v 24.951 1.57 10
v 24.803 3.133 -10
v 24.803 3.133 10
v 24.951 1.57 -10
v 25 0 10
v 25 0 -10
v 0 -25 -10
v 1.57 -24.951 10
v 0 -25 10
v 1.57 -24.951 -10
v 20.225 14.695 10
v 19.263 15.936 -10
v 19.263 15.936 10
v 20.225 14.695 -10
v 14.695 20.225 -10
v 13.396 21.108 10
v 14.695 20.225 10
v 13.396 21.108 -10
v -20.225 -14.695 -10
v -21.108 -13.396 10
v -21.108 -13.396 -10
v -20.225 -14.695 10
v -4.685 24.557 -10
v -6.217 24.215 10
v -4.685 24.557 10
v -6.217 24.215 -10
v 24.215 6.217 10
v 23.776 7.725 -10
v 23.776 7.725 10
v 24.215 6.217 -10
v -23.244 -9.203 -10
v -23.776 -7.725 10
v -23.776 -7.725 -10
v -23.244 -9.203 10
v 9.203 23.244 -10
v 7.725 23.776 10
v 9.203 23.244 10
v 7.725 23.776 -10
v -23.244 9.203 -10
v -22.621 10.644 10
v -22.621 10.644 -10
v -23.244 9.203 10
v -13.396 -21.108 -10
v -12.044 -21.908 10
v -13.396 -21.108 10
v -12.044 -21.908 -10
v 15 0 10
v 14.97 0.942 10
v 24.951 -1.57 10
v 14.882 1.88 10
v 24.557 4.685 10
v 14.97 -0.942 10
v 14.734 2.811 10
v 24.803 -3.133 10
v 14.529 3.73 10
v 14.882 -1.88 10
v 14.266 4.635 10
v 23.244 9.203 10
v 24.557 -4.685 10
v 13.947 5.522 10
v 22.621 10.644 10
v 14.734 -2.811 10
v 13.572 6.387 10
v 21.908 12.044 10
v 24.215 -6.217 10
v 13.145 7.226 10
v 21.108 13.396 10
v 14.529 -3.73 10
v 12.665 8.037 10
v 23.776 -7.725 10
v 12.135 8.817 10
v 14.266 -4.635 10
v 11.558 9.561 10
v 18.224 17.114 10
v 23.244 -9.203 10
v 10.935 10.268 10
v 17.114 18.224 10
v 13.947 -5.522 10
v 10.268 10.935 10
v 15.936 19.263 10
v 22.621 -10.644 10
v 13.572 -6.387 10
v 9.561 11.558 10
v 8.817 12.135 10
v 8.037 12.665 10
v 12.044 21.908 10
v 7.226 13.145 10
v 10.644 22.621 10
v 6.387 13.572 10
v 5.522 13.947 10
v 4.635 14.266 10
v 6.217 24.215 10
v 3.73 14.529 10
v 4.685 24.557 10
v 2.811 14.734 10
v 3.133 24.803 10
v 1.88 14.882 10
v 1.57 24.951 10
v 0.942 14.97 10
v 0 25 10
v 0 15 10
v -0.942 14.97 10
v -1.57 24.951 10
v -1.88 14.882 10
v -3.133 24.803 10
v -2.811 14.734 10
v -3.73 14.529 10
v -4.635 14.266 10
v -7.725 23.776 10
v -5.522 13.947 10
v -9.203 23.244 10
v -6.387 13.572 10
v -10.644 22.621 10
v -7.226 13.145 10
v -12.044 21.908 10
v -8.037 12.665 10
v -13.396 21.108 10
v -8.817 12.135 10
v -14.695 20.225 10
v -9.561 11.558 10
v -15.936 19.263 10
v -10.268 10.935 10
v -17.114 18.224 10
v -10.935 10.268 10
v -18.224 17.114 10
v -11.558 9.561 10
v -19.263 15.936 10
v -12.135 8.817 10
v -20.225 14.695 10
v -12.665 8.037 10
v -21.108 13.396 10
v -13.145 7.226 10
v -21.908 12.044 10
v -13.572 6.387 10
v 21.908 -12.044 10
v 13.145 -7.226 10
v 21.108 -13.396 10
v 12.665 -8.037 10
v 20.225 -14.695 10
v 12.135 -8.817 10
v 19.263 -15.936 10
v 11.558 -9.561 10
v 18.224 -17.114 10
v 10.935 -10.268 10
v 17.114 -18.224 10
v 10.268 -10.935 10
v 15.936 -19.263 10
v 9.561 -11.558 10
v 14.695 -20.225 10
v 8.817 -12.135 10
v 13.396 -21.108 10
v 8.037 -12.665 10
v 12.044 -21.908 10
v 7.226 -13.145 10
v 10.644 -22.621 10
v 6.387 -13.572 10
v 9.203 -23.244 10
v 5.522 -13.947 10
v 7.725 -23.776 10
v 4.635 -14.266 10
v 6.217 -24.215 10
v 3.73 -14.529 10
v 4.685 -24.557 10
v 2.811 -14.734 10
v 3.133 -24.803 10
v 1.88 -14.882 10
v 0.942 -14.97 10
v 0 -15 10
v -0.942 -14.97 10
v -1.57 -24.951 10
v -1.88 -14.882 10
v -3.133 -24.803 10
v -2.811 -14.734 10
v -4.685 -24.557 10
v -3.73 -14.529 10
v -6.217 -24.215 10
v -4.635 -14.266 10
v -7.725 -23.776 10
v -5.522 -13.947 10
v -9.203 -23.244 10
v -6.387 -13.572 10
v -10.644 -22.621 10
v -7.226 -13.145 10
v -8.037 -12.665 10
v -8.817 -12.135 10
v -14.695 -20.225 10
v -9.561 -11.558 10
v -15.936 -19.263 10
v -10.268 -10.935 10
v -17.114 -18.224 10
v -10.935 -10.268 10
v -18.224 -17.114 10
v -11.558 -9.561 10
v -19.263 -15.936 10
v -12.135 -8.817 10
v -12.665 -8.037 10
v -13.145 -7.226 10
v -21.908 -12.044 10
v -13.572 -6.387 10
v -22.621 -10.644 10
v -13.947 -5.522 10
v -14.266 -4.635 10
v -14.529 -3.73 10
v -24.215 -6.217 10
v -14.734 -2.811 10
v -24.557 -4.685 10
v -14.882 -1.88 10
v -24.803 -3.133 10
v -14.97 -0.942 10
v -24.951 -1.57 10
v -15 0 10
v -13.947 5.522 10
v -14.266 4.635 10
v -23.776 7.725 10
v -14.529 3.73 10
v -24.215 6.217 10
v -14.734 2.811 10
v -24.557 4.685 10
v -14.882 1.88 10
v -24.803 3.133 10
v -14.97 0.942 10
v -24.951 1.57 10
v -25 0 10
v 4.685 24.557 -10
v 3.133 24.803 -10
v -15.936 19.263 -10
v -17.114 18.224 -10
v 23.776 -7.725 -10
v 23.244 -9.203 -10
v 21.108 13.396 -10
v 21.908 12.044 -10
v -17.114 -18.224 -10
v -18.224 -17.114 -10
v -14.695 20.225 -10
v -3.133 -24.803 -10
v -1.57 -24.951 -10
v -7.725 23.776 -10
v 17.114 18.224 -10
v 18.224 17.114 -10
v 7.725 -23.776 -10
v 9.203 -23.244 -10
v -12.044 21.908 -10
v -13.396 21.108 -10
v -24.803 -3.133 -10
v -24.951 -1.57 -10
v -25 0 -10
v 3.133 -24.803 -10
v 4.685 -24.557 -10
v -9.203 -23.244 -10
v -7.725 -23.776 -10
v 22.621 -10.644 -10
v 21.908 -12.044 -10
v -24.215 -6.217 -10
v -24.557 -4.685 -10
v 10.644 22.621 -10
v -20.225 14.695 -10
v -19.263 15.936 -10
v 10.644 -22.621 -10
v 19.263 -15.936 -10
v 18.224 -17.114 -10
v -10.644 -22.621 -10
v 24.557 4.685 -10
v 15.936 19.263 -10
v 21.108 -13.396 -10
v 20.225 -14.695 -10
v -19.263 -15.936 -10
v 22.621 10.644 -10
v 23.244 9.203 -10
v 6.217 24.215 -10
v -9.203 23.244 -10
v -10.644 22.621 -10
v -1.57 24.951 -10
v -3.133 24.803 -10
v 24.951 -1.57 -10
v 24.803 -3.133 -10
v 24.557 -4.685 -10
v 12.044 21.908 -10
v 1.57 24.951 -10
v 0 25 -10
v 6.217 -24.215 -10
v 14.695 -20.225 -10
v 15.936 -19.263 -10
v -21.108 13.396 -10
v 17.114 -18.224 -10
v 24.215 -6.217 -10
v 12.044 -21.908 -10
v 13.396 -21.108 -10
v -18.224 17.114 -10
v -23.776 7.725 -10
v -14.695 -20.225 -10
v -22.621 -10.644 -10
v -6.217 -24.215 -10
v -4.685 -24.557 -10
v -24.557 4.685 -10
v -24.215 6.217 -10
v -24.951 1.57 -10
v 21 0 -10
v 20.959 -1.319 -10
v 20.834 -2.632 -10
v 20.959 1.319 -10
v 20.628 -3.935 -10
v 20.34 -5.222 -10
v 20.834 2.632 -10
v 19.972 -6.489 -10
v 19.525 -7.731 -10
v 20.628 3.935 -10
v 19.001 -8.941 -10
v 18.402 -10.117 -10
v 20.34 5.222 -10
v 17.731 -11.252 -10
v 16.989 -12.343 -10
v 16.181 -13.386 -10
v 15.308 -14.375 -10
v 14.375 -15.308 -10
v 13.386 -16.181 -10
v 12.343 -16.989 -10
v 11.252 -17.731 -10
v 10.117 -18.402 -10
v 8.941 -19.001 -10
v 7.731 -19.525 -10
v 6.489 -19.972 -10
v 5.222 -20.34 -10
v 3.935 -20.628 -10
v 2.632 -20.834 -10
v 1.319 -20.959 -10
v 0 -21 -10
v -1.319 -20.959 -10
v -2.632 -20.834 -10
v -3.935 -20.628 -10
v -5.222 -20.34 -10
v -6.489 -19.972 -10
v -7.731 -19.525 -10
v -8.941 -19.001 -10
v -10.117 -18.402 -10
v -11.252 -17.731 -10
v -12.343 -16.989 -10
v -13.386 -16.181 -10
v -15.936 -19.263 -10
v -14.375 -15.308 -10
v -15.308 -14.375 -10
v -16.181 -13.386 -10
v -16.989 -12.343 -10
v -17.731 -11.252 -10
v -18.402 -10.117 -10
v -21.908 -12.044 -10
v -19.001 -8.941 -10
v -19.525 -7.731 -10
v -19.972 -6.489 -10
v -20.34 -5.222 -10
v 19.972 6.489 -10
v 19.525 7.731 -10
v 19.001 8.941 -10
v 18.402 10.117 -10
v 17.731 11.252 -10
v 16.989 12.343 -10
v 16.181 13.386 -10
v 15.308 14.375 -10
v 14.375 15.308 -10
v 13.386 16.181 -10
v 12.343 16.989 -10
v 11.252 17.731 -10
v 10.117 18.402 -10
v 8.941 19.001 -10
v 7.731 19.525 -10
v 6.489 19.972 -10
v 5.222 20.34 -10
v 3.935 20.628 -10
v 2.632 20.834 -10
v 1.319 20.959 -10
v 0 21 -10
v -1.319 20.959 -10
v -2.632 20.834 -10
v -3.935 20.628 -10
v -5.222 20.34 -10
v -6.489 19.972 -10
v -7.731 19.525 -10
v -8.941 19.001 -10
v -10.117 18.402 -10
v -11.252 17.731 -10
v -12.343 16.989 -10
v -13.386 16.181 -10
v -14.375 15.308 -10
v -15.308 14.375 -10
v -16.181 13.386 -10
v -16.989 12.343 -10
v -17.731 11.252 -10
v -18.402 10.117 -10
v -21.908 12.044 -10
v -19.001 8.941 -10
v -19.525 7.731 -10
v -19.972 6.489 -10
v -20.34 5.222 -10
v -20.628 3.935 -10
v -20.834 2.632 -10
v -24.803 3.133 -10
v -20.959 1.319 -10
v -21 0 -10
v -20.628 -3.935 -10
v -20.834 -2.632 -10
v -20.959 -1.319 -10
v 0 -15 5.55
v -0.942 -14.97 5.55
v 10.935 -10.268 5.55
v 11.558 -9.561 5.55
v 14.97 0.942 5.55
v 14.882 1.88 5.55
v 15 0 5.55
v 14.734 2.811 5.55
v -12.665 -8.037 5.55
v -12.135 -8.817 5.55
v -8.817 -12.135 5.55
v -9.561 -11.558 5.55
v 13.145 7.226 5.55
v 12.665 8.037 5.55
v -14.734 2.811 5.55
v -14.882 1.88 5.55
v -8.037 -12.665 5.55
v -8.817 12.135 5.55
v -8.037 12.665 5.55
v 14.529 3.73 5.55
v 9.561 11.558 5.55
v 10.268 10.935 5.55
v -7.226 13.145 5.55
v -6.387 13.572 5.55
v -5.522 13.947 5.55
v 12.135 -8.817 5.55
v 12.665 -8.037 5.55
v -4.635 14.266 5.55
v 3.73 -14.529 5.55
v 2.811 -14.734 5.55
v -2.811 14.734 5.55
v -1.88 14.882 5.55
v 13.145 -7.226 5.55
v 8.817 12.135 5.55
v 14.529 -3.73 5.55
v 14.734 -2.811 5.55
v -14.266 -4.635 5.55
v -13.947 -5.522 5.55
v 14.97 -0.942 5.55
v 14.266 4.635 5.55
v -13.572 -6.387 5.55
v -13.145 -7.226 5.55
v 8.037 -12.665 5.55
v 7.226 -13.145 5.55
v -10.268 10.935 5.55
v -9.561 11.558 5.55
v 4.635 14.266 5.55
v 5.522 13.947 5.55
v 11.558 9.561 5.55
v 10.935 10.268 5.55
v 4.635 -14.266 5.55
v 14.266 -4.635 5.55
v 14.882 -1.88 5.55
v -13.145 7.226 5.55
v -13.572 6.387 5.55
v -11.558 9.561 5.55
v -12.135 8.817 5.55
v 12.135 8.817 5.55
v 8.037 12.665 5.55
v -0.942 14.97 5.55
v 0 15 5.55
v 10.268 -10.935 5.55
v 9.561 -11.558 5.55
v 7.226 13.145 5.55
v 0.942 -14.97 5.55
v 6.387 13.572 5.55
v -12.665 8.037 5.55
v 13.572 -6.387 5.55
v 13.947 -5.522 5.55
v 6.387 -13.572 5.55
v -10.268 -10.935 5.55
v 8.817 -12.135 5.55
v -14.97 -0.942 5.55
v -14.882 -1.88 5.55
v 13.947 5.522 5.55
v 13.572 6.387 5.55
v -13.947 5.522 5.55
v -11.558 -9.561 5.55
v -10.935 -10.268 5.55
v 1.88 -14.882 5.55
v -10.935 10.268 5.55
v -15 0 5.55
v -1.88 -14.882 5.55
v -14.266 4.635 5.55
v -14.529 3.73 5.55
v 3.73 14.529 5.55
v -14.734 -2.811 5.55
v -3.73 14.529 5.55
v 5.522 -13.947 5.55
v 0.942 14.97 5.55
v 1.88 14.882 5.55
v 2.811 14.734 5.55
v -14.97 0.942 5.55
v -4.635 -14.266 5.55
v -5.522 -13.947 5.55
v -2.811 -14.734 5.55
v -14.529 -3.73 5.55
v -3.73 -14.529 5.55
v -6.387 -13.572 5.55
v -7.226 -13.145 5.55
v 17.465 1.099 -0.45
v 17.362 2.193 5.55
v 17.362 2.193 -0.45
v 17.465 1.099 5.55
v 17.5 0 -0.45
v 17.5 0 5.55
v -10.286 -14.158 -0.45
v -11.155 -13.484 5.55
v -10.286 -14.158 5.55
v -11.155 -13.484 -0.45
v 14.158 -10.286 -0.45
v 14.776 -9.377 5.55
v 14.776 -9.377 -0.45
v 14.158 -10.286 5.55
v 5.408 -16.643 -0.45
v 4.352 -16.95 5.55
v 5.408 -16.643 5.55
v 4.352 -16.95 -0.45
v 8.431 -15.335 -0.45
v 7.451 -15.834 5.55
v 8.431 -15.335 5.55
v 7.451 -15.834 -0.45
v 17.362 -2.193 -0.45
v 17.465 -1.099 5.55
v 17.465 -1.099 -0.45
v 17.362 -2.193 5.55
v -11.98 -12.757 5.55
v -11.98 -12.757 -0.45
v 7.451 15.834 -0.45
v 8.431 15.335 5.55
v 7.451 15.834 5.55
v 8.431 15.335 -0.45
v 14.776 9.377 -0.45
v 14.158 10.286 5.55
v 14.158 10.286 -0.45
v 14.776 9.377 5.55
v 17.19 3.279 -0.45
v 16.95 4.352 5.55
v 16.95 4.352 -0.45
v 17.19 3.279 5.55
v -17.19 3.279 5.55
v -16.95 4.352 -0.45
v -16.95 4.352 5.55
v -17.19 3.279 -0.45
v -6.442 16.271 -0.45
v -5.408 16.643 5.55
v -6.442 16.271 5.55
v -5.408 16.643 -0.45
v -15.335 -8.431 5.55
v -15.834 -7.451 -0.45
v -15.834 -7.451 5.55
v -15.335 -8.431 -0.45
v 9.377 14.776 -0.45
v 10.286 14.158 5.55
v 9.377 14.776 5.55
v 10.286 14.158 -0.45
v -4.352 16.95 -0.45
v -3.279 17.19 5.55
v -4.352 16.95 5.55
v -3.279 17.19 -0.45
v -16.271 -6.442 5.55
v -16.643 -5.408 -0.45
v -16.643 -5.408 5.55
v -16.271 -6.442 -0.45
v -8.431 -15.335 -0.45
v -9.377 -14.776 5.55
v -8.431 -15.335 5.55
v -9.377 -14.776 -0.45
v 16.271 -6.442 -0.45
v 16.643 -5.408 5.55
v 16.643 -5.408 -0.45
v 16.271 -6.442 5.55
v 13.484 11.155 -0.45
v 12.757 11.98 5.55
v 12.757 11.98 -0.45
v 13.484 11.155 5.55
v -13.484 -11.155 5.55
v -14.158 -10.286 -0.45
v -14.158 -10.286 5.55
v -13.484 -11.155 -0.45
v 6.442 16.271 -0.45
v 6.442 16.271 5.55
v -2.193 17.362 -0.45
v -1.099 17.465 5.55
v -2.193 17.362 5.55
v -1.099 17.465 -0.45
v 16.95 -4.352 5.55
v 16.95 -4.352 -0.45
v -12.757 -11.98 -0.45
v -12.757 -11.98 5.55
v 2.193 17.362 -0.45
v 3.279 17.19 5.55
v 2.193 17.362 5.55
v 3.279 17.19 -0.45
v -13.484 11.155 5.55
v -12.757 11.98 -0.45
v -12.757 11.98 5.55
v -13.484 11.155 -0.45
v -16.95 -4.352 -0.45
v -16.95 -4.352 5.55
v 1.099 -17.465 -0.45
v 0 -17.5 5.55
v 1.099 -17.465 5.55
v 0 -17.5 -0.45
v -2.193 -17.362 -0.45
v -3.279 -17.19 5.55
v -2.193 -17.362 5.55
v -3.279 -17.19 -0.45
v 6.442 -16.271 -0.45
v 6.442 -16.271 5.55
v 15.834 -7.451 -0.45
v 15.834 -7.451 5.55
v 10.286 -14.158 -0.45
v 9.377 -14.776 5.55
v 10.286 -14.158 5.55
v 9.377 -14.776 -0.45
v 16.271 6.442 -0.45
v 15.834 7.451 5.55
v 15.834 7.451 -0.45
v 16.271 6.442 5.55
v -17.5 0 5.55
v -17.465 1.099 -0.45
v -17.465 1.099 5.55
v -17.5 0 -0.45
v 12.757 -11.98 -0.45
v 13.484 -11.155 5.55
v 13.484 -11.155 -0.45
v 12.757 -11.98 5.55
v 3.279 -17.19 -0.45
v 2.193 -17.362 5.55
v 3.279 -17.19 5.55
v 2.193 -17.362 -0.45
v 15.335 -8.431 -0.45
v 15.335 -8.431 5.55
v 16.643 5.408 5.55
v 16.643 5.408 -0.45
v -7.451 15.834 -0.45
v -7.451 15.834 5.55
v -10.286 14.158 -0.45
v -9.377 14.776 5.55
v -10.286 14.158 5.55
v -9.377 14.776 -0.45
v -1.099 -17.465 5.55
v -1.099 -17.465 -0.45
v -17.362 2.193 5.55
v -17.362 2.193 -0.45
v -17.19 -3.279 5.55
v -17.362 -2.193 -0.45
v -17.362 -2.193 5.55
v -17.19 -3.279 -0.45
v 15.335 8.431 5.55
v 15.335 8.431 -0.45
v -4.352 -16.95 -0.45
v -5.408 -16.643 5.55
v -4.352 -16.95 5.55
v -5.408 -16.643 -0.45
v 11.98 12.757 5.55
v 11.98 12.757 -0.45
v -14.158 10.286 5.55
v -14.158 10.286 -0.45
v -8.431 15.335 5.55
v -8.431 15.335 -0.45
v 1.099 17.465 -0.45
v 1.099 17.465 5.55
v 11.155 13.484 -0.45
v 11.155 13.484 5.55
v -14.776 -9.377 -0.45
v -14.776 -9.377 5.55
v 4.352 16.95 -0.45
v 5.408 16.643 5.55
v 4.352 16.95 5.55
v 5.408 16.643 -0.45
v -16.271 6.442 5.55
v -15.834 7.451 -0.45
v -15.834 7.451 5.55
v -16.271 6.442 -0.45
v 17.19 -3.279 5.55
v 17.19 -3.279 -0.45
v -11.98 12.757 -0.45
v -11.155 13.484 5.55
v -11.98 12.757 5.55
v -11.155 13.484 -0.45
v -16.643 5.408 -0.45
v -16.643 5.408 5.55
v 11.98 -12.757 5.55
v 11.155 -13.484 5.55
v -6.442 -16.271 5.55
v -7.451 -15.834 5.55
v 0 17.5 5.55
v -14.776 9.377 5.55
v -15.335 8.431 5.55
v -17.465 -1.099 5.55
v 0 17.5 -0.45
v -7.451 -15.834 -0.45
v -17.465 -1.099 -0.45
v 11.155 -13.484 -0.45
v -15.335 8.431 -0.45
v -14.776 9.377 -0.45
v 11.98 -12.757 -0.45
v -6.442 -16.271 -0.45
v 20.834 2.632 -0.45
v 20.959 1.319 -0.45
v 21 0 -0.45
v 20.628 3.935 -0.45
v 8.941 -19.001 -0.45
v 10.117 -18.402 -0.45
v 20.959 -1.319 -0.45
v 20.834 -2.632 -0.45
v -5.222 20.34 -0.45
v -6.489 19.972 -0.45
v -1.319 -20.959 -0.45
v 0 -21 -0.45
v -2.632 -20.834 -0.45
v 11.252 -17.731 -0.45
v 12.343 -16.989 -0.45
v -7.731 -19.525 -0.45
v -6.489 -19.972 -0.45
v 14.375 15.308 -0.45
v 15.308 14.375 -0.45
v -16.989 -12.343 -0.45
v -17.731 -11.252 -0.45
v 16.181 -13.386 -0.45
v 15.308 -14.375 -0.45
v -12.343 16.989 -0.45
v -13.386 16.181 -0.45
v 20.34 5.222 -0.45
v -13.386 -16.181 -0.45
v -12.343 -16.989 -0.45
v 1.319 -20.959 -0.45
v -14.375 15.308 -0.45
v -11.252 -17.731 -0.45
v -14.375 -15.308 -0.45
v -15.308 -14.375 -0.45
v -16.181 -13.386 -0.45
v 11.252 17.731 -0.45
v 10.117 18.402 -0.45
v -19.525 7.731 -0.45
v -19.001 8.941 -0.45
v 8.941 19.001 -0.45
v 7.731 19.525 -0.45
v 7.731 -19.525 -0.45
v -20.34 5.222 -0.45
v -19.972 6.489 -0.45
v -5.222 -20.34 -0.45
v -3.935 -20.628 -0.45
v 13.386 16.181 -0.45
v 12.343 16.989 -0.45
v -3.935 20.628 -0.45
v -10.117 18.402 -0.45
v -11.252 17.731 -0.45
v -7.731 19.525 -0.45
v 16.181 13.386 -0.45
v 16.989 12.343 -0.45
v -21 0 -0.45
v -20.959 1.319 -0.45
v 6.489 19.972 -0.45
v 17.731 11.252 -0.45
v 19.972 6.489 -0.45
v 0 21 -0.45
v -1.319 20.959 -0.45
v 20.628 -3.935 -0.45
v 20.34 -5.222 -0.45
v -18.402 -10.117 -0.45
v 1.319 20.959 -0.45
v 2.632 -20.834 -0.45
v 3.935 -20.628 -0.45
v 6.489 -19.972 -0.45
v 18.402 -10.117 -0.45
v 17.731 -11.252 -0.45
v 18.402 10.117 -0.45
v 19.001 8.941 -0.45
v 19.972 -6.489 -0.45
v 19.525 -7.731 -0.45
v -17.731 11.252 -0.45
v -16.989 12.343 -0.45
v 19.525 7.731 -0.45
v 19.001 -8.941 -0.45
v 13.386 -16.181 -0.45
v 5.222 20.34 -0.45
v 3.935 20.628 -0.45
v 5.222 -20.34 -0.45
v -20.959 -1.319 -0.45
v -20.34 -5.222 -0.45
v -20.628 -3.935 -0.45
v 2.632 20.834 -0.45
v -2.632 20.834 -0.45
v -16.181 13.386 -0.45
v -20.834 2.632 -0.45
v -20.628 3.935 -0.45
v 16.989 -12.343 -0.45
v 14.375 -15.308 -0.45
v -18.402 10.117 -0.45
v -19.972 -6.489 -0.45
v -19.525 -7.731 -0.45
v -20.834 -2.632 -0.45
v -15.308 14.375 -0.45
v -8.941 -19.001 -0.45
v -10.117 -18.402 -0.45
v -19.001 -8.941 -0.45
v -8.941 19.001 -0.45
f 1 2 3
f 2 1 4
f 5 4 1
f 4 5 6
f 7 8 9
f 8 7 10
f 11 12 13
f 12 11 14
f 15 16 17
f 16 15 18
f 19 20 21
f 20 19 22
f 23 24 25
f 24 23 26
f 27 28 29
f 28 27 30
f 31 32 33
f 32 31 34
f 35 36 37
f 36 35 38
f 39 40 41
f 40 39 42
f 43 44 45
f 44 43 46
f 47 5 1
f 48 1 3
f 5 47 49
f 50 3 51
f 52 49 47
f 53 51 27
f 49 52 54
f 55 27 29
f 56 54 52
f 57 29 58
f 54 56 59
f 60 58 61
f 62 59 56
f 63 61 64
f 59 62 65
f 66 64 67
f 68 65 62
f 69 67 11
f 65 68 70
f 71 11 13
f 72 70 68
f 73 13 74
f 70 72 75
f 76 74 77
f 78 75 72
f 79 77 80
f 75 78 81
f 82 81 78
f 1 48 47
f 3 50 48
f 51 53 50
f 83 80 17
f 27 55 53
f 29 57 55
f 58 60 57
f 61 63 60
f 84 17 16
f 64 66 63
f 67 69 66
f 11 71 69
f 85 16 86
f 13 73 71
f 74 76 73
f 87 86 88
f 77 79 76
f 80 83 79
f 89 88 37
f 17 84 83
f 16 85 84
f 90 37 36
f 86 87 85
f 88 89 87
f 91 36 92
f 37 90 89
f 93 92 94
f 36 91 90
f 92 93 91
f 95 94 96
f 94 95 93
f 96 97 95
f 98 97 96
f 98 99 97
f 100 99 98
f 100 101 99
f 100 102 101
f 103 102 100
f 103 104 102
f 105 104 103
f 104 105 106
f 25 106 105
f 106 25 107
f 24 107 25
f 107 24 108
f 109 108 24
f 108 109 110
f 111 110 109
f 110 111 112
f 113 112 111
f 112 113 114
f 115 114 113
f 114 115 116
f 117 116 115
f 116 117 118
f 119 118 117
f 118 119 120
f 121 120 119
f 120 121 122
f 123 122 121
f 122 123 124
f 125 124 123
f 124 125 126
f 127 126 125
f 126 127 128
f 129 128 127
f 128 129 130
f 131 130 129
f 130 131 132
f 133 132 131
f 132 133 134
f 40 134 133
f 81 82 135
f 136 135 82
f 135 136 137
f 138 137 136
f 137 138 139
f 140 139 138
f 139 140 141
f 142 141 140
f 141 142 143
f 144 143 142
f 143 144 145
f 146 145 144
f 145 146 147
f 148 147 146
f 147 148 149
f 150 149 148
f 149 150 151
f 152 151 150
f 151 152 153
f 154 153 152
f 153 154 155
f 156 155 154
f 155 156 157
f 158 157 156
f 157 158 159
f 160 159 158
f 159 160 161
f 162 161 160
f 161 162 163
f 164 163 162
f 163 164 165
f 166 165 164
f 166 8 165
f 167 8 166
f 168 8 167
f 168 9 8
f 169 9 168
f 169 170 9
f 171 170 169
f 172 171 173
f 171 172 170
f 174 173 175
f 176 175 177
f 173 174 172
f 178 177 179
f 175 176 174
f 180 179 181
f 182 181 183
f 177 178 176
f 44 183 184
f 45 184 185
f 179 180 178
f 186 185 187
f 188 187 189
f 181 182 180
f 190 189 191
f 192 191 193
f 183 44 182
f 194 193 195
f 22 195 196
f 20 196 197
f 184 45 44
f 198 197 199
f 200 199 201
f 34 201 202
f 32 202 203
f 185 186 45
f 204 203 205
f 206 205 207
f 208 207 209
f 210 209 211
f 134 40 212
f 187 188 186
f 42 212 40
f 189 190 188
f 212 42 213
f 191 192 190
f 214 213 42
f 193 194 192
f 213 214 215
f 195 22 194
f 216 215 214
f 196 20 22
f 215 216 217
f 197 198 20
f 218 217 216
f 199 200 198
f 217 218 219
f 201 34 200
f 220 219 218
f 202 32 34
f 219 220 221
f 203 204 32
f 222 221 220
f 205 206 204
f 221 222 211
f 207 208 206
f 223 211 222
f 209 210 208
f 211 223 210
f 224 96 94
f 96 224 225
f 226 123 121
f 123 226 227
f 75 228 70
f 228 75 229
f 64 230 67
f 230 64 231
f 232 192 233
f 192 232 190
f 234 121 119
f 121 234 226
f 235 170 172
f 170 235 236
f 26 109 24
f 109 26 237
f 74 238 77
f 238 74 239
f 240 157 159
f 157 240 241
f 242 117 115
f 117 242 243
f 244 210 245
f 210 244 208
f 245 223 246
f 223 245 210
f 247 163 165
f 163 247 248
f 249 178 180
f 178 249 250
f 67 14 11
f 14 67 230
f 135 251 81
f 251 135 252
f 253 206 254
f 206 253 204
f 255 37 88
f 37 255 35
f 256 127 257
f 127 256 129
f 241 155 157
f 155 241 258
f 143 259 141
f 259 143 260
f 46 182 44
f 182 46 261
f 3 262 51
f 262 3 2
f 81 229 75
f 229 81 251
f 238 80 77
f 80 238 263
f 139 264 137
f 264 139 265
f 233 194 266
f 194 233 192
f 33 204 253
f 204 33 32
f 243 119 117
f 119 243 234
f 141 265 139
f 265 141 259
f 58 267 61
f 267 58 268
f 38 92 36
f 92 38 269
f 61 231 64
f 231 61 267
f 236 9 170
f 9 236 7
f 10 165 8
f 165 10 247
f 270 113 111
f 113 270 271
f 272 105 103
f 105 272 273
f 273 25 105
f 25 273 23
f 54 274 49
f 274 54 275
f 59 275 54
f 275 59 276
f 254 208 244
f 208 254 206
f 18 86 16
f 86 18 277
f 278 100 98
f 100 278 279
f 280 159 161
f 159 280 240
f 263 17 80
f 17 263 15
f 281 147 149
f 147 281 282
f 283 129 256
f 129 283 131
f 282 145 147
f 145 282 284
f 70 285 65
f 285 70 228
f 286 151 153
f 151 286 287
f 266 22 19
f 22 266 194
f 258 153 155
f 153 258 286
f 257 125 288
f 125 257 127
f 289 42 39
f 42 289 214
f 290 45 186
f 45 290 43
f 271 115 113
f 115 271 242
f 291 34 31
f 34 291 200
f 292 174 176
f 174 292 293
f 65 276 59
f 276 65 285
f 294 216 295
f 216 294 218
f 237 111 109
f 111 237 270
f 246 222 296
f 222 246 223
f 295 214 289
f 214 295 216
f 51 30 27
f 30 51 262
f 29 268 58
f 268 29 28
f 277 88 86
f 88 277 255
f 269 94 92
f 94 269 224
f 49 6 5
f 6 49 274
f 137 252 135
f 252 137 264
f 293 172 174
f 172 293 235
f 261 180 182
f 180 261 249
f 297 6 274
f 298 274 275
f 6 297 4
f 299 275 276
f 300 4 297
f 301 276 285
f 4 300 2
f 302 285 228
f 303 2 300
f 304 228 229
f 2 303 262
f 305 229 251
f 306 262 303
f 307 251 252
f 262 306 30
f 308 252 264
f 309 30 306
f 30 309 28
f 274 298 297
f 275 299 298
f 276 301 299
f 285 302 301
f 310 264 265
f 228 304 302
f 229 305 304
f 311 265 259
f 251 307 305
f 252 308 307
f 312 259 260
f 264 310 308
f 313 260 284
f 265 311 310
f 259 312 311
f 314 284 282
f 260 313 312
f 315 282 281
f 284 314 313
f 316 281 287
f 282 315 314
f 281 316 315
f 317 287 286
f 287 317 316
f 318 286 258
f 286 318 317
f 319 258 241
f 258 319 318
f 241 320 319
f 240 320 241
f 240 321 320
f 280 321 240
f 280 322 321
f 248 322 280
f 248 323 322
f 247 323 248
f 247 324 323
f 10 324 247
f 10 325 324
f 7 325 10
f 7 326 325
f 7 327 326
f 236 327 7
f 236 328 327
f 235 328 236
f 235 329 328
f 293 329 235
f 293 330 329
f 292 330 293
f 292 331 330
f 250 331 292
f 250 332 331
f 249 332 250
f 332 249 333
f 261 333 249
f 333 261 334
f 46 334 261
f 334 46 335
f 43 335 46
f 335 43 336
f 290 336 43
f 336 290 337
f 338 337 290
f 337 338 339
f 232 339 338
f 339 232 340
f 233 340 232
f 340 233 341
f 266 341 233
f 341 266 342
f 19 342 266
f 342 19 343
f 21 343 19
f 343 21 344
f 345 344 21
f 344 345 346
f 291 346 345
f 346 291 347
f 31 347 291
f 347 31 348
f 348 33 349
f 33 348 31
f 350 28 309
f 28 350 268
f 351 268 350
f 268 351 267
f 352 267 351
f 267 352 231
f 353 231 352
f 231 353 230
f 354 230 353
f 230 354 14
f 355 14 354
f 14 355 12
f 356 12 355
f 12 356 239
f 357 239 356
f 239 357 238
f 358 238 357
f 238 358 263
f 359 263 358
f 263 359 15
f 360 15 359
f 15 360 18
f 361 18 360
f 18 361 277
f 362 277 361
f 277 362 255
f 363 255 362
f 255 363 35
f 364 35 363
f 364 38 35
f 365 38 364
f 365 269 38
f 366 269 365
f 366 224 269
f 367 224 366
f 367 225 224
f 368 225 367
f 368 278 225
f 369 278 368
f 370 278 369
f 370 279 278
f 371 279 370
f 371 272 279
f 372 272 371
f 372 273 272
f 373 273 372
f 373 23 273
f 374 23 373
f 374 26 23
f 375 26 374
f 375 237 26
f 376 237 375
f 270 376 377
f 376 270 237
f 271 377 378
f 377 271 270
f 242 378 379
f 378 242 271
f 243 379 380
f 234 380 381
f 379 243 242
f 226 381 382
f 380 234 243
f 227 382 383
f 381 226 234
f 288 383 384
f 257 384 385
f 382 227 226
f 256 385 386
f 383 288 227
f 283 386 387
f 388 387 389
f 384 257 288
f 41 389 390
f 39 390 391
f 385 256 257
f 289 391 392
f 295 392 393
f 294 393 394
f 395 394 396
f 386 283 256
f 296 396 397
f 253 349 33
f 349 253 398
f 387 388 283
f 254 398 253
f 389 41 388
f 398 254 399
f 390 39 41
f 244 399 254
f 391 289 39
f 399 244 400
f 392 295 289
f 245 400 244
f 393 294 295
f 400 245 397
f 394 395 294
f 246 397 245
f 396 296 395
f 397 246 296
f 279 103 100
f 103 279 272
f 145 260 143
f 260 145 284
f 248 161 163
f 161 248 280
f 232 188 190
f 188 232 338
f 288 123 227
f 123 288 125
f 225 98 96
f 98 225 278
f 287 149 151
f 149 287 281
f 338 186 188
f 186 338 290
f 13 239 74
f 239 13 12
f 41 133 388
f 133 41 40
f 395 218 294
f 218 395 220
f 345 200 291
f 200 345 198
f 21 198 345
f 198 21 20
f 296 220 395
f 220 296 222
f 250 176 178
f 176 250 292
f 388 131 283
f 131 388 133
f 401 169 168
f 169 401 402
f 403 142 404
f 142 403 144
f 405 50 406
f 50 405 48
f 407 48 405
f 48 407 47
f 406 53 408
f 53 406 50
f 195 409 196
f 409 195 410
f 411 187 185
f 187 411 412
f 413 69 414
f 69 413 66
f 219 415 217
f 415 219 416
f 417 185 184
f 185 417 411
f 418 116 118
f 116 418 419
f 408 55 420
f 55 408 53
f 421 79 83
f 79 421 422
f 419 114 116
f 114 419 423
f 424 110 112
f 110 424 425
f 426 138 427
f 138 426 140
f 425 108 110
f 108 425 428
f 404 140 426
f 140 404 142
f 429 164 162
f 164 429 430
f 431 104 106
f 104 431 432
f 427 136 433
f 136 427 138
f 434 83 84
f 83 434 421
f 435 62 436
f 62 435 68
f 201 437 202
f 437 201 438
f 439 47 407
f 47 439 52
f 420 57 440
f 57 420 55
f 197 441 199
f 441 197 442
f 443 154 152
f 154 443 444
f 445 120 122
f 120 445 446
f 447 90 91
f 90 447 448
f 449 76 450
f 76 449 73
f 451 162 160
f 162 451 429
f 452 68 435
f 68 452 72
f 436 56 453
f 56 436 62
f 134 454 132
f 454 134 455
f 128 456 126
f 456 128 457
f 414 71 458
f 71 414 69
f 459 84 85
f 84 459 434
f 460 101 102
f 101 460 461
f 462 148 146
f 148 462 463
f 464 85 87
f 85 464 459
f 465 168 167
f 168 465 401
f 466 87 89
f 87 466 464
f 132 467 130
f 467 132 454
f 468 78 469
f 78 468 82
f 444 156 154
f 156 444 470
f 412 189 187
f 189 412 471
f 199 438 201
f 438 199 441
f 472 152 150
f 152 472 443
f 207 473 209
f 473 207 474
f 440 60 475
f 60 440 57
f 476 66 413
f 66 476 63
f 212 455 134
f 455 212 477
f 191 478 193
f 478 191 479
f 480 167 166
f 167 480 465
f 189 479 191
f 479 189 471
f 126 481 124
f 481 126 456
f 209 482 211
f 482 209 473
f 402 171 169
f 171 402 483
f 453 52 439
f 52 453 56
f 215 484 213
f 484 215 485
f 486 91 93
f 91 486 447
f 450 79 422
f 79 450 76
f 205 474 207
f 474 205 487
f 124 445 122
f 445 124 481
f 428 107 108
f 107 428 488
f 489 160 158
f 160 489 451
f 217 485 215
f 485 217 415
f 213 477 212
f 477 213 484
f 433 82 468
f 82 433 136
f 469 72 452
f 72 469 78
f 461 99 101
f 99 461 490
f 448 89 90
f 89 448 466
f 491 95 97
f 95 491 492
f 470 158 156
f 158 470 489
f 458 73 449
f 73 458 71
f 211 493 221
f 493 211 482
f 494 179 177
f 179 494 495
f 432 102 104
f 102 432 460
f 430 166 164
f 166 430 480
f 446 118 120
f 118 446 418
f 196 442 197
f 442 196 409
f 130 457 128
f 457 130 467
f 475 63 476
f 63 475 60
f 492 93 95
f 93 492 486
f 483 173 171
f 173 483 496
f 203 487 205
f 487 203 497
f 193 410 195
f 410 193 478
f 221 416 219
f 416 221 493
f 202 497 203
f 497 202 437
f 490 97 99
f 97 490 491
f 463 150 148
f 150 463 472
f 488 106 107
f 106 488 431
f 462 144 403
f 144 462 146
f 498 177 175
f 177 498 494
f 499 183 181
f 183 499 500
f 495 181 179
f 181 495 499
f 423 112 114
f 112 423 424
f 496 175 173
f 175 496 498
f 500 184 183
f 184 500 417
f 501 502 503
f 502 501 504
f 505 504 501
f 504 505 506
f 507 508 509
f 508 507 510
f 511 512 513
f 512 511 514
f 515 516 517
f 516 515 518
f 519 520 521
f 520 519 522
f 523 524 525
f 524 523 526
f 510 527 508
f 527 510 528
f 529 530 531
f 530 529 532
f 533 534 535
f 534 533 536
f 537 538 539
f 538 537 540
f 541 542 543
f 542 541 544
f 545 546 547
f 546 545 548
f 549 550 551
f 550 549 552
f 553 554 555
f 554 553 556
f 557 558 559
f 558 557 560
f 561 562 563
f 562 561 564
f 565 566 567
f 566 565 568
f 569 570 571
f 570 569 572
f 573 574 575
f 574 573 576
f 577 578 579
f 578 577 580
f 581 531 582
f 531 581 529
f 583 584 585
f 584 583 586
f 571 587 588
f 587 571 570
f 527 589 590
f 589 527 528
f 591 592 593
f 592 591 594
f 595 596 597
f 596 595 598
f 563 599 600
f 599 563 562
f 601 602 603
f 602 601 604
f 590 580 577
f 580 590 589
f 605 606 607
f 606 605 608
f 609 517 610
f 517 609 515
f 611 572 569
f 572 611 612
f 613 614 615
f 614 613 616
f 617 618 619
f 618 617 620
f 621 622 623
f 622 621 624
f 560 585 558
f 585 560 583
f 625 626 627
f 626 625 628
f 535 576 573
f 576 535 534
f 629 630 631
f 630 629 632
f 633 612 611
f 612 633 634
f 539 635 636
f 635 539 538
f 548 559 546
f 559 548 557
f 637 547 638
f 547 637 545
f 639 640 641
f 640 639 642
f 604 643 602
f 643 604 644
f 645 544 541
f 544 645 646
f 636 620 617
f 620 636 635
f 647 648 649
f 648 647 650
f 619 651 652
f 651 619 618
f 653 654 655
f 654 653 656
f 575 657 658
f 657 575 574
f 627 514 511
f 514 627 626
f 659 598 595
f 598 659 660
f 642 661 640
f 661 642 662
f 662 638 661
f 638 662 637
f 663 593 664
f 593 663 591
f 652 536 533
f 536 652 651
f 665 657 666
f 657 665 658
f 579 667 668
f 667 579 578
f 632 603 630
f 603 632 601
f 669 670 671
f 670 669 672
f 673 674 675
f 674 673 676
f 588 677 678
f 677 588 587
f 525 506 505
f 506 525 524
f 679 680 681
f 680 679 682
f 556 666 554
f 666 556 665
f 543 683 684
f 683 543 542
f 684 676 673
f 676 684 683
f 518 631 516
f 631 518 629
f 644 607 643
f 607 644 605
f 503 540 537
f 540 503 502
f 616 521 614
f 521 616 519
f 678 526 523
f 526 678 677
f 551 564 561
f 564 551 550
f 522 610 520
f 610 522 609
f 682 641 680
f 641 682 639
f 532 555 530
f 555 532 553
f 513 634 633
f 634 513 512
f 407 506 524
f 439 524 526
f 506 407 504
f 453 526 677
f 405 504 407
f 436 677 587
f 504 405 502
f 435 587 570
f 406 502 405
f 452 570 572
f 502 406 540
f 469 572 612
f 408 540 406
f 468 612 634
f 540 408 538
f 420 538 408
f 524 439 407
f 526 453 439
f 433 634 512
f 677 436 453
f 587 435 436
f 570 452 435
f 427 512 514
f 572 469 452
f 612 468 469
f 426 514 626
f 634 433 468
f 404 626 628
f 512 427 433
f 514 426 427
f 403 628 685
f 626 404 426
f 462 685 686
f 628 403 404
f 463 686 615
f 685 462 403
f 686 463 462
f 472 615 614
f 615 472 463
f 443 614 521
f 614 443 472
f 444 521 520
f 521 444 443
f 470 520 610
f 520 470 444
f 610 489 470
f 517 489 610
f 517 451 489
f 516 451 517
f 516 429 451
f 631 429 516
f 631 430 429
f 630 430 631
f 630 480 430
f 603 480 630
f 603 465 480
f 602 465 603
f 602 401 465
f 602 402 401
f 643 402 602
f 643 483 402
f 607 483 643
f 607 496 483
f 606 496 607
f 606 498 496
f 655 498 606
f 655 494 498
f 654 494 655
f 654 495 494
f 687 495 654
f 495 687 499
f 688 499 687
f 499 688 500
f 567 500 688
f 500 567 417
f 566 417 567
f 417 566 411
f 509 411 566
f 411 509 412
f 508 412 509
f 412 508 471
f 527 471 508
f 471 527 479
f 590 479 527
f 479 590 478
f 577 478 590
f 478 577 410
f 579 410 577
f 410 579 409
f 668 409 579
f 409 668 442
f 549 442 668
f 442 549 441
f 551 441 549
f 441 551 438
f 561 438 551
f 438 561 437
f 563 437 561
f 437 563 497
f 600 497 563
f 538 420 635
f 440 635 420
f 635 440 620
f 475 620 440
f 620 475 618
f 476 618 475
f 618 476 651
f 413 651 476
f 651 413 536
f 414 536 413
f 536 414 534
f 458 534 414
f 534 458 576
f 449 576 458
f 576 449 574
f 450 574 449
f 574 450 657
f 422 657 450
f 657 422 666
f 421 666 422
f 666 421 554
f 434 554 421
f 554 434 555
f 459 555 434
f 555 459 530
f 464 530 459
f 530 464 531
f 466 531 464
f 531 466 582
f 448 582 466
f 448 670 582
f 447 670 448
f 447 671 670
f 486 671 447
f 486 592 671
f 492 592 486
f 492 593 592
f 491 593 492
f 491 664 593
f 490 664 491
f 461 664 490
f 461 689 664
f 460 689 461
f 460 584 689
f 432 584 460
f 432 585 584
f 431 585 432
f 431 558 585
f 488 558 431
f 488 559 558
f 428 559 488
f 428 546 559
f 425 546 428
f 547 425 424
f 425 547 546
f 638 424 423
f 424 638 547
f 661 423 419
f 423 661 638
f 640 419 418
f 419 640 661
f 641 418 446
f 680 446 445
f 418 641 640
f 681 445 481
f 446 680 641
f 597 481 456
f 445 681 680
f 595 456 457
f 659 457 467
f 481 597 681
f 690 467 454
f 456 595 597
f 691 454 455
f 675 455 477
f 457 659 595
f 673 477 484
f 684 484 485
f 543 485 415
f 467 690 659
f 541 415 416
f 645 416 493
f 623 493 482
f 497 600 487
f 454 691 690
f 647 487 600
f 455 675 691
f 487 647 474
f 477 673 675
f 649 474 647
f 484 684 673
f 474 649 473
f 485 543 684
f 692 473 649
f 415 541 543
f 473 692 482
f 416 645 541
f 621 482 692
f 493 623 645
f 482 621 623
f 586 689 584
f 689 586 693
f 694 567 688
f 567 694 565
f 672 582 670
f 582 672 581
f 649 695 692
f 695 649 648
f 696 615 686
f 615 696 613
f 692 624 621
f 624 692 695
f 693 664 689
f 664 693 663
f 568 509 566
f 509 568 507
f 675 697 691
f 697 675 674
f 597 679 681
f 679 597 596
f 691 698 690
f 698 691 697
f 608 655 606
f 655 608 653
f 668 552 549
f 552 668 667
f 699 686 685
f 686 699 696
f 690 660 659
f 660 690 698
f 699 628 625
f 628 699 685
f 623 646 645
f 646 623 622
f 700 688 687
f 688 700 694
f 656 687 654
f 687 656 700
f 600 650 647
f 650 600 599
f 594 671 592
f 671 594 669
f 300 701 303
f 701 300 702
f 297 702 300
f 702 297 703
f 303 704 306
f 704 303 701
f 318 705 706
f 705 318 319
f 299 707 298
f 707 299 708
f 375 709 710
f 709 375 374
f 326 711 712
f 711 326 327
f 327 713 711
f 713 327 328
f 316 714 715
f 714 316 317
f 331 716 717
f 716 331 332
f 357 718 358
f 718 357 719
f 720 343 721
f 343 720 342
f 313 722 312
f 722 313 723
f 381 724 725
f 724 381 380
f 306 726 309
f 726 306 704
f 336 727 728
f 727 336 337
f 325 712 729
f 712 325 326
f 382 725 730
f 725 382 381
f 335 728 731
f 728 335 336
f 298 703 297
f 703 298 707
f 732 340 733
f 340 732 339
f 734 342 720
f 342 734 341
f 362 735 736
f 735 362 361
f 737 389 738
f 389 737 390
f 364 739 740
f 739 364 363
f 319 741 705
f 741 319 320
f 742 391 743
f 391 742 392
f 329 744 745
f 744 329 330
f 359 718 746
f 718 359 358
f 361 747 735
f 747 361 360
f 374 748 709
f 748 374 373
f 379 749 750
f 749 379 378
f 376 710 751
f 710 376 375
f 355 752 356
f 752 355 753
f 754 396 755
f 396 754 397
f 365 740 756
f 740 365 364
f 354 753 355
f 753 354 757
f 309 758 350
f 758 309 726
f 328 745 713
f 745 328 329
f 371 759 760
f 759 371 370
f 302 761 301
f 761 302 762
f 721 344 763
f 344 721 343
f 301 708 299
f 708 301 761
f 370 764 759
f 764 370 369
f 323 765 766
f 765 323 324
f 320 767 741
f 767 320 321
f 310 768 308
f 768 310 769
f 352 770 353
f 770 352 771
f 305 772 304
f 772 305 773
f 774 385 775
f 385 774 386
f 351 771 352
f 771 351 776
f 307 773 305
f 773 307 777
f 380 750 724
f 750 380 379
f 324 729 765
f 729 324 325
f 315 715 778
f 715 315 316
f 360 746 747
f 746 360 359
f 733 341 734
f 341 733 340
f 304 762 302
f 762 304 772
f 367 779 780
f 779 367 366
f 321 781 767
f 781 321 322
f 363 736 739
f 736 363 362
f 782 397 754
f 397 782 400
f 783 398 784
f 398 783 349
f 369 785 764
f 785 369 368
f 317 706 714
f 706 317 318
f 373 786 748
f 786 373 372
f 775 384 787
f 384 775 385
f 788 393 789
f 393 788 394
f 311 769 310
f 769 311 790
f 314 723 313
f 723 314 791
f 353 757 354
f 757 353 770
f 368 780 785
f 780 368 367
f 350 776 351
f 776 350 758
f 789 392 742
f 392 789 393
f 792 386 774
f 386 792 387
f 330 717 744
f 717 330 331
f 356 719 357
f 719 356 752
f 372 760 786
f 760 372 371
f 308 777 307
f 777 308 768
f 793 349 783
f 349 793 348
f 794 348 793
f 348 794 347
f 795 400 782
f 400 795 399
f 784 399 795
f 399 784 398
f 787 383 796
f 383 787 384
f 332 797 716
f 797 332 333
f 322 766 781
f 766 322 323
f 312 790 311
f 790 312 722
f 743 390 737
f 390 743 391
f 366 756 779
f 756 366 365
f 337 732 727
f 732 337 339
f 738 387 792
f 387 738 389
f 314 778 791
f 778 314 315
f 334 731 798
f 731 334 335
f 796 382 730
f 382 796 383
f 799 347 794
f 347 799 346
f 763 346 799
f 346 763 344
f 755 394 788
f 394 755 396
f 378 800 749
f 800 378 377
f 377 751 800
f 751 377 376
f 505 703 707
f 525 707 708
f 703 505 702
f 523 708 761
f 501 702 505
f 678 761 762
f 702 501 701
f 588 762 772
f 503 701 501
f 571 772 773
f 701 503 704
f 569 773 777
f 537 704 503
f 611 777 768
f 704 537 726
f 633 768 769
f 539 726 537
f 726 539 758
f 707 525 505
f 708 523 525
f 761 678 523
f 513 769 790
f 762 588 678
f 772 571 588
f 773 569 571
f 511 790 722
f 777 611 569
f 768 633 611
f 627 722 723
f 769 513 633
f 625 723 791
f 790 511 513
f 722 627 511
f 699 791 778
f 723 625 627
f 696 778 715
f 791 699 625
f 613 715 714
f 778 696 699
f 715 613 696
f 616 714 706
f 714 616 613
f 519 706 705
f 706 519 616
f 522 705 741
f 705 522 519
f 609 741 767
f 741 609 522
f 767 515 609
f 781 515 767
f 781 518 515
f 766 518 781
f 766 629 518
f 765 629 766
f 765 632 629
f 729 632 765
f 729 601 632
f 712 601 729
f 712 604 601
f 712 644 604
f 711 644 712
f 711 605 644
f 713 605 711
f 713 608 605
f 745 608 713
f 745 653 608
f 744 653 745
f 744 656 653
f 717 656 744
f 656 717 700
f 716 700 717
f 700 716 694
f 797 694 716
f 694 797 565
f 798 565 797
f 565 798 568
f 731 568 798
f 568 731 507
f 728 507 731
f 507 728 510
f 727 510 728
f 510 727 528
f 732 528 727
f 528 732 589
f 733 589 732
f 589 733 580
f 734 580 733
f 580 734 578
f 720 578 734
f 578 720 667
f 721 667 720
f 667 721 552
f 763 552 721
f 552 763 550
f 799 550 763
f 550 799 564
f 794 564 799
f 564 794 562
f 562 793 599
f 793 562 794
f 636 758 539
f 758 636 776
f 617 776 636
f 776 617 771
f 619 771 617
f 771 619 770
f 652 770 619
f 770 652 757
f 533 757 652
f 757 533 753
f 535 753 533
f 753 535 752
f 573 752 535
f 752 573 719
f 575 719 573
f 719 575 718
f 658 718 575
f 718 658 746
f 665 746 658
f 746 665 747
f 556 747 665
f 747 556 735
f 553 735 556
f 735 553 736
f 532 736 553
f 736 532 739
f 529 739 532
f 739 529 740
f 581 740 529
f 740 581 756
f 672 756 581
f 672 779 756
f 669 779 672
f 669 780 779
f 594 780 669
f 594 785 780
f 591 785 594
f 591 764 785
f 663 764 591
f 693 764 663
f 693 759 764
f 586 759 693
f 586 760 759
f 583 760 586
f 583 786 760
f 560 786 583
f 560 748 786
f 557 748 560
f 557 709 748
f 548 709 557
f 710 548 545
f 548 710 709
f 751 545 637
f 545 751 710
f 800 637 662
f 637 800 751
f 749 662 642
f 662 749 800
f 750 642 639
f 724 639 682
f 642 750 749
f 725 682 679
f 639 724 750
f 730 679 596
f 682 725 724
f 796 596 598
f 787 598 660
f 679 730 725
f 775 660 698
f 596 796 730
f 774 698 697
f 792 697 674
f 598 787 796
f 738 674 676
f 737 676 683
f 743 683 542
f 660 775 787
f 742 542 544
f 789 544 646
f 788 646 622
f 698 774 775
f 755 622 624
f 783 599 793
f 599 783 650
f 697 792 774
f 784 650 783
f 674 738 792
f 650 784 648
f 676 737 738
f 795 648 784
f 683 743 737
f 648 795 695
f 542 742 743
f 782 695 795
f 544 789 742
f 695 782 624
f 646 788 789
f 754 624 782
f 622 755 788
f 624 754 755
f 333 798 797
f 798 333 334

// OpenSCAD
// --- PARAMETERS ---
$fn = 100; // Resolution of the circles (higher is smoother)

// Main body dimensions (Outer layer)
outer_diameter = 50;
outer_height = 20;

// Dimensions for the stepped interior (Width = Diameter)
layer1_diameter = 30;
layer1_height = 4.5;

layer2_diameter = 35;
layer2_height = 6;

layer3_diameter = 42;
layer3_height = 10;

// --- RENDERING ---

difference() {
    // 1. Main body (The base shape)
    color("lightblue")
    cylinder(d = outer_diameter, h = outer_height, center = true);

    // 2. Cutouts (Subtracted from top to bottom)
    
    // Layer 1
    translate([0, 0, outer_height/2 - layer1_height/2])
        cylinder(d = layer1_diameter, h = layer1_height + 0.1, center = true);

    // Layer 2
    translate([0, 0, outer_height/2 - layer1_height - layer2_height/2])
        cylinder(d = layer2_diameter, h = layer2_height + 0.1, center = true);

    // Layer 3
    translate([0, 0, outer_height/2 - layer1_height - layer2_height - layer3_height/2])
        cylinder(d = layer3_diameter, h = layer3_height + 0.1, center = true);
}
